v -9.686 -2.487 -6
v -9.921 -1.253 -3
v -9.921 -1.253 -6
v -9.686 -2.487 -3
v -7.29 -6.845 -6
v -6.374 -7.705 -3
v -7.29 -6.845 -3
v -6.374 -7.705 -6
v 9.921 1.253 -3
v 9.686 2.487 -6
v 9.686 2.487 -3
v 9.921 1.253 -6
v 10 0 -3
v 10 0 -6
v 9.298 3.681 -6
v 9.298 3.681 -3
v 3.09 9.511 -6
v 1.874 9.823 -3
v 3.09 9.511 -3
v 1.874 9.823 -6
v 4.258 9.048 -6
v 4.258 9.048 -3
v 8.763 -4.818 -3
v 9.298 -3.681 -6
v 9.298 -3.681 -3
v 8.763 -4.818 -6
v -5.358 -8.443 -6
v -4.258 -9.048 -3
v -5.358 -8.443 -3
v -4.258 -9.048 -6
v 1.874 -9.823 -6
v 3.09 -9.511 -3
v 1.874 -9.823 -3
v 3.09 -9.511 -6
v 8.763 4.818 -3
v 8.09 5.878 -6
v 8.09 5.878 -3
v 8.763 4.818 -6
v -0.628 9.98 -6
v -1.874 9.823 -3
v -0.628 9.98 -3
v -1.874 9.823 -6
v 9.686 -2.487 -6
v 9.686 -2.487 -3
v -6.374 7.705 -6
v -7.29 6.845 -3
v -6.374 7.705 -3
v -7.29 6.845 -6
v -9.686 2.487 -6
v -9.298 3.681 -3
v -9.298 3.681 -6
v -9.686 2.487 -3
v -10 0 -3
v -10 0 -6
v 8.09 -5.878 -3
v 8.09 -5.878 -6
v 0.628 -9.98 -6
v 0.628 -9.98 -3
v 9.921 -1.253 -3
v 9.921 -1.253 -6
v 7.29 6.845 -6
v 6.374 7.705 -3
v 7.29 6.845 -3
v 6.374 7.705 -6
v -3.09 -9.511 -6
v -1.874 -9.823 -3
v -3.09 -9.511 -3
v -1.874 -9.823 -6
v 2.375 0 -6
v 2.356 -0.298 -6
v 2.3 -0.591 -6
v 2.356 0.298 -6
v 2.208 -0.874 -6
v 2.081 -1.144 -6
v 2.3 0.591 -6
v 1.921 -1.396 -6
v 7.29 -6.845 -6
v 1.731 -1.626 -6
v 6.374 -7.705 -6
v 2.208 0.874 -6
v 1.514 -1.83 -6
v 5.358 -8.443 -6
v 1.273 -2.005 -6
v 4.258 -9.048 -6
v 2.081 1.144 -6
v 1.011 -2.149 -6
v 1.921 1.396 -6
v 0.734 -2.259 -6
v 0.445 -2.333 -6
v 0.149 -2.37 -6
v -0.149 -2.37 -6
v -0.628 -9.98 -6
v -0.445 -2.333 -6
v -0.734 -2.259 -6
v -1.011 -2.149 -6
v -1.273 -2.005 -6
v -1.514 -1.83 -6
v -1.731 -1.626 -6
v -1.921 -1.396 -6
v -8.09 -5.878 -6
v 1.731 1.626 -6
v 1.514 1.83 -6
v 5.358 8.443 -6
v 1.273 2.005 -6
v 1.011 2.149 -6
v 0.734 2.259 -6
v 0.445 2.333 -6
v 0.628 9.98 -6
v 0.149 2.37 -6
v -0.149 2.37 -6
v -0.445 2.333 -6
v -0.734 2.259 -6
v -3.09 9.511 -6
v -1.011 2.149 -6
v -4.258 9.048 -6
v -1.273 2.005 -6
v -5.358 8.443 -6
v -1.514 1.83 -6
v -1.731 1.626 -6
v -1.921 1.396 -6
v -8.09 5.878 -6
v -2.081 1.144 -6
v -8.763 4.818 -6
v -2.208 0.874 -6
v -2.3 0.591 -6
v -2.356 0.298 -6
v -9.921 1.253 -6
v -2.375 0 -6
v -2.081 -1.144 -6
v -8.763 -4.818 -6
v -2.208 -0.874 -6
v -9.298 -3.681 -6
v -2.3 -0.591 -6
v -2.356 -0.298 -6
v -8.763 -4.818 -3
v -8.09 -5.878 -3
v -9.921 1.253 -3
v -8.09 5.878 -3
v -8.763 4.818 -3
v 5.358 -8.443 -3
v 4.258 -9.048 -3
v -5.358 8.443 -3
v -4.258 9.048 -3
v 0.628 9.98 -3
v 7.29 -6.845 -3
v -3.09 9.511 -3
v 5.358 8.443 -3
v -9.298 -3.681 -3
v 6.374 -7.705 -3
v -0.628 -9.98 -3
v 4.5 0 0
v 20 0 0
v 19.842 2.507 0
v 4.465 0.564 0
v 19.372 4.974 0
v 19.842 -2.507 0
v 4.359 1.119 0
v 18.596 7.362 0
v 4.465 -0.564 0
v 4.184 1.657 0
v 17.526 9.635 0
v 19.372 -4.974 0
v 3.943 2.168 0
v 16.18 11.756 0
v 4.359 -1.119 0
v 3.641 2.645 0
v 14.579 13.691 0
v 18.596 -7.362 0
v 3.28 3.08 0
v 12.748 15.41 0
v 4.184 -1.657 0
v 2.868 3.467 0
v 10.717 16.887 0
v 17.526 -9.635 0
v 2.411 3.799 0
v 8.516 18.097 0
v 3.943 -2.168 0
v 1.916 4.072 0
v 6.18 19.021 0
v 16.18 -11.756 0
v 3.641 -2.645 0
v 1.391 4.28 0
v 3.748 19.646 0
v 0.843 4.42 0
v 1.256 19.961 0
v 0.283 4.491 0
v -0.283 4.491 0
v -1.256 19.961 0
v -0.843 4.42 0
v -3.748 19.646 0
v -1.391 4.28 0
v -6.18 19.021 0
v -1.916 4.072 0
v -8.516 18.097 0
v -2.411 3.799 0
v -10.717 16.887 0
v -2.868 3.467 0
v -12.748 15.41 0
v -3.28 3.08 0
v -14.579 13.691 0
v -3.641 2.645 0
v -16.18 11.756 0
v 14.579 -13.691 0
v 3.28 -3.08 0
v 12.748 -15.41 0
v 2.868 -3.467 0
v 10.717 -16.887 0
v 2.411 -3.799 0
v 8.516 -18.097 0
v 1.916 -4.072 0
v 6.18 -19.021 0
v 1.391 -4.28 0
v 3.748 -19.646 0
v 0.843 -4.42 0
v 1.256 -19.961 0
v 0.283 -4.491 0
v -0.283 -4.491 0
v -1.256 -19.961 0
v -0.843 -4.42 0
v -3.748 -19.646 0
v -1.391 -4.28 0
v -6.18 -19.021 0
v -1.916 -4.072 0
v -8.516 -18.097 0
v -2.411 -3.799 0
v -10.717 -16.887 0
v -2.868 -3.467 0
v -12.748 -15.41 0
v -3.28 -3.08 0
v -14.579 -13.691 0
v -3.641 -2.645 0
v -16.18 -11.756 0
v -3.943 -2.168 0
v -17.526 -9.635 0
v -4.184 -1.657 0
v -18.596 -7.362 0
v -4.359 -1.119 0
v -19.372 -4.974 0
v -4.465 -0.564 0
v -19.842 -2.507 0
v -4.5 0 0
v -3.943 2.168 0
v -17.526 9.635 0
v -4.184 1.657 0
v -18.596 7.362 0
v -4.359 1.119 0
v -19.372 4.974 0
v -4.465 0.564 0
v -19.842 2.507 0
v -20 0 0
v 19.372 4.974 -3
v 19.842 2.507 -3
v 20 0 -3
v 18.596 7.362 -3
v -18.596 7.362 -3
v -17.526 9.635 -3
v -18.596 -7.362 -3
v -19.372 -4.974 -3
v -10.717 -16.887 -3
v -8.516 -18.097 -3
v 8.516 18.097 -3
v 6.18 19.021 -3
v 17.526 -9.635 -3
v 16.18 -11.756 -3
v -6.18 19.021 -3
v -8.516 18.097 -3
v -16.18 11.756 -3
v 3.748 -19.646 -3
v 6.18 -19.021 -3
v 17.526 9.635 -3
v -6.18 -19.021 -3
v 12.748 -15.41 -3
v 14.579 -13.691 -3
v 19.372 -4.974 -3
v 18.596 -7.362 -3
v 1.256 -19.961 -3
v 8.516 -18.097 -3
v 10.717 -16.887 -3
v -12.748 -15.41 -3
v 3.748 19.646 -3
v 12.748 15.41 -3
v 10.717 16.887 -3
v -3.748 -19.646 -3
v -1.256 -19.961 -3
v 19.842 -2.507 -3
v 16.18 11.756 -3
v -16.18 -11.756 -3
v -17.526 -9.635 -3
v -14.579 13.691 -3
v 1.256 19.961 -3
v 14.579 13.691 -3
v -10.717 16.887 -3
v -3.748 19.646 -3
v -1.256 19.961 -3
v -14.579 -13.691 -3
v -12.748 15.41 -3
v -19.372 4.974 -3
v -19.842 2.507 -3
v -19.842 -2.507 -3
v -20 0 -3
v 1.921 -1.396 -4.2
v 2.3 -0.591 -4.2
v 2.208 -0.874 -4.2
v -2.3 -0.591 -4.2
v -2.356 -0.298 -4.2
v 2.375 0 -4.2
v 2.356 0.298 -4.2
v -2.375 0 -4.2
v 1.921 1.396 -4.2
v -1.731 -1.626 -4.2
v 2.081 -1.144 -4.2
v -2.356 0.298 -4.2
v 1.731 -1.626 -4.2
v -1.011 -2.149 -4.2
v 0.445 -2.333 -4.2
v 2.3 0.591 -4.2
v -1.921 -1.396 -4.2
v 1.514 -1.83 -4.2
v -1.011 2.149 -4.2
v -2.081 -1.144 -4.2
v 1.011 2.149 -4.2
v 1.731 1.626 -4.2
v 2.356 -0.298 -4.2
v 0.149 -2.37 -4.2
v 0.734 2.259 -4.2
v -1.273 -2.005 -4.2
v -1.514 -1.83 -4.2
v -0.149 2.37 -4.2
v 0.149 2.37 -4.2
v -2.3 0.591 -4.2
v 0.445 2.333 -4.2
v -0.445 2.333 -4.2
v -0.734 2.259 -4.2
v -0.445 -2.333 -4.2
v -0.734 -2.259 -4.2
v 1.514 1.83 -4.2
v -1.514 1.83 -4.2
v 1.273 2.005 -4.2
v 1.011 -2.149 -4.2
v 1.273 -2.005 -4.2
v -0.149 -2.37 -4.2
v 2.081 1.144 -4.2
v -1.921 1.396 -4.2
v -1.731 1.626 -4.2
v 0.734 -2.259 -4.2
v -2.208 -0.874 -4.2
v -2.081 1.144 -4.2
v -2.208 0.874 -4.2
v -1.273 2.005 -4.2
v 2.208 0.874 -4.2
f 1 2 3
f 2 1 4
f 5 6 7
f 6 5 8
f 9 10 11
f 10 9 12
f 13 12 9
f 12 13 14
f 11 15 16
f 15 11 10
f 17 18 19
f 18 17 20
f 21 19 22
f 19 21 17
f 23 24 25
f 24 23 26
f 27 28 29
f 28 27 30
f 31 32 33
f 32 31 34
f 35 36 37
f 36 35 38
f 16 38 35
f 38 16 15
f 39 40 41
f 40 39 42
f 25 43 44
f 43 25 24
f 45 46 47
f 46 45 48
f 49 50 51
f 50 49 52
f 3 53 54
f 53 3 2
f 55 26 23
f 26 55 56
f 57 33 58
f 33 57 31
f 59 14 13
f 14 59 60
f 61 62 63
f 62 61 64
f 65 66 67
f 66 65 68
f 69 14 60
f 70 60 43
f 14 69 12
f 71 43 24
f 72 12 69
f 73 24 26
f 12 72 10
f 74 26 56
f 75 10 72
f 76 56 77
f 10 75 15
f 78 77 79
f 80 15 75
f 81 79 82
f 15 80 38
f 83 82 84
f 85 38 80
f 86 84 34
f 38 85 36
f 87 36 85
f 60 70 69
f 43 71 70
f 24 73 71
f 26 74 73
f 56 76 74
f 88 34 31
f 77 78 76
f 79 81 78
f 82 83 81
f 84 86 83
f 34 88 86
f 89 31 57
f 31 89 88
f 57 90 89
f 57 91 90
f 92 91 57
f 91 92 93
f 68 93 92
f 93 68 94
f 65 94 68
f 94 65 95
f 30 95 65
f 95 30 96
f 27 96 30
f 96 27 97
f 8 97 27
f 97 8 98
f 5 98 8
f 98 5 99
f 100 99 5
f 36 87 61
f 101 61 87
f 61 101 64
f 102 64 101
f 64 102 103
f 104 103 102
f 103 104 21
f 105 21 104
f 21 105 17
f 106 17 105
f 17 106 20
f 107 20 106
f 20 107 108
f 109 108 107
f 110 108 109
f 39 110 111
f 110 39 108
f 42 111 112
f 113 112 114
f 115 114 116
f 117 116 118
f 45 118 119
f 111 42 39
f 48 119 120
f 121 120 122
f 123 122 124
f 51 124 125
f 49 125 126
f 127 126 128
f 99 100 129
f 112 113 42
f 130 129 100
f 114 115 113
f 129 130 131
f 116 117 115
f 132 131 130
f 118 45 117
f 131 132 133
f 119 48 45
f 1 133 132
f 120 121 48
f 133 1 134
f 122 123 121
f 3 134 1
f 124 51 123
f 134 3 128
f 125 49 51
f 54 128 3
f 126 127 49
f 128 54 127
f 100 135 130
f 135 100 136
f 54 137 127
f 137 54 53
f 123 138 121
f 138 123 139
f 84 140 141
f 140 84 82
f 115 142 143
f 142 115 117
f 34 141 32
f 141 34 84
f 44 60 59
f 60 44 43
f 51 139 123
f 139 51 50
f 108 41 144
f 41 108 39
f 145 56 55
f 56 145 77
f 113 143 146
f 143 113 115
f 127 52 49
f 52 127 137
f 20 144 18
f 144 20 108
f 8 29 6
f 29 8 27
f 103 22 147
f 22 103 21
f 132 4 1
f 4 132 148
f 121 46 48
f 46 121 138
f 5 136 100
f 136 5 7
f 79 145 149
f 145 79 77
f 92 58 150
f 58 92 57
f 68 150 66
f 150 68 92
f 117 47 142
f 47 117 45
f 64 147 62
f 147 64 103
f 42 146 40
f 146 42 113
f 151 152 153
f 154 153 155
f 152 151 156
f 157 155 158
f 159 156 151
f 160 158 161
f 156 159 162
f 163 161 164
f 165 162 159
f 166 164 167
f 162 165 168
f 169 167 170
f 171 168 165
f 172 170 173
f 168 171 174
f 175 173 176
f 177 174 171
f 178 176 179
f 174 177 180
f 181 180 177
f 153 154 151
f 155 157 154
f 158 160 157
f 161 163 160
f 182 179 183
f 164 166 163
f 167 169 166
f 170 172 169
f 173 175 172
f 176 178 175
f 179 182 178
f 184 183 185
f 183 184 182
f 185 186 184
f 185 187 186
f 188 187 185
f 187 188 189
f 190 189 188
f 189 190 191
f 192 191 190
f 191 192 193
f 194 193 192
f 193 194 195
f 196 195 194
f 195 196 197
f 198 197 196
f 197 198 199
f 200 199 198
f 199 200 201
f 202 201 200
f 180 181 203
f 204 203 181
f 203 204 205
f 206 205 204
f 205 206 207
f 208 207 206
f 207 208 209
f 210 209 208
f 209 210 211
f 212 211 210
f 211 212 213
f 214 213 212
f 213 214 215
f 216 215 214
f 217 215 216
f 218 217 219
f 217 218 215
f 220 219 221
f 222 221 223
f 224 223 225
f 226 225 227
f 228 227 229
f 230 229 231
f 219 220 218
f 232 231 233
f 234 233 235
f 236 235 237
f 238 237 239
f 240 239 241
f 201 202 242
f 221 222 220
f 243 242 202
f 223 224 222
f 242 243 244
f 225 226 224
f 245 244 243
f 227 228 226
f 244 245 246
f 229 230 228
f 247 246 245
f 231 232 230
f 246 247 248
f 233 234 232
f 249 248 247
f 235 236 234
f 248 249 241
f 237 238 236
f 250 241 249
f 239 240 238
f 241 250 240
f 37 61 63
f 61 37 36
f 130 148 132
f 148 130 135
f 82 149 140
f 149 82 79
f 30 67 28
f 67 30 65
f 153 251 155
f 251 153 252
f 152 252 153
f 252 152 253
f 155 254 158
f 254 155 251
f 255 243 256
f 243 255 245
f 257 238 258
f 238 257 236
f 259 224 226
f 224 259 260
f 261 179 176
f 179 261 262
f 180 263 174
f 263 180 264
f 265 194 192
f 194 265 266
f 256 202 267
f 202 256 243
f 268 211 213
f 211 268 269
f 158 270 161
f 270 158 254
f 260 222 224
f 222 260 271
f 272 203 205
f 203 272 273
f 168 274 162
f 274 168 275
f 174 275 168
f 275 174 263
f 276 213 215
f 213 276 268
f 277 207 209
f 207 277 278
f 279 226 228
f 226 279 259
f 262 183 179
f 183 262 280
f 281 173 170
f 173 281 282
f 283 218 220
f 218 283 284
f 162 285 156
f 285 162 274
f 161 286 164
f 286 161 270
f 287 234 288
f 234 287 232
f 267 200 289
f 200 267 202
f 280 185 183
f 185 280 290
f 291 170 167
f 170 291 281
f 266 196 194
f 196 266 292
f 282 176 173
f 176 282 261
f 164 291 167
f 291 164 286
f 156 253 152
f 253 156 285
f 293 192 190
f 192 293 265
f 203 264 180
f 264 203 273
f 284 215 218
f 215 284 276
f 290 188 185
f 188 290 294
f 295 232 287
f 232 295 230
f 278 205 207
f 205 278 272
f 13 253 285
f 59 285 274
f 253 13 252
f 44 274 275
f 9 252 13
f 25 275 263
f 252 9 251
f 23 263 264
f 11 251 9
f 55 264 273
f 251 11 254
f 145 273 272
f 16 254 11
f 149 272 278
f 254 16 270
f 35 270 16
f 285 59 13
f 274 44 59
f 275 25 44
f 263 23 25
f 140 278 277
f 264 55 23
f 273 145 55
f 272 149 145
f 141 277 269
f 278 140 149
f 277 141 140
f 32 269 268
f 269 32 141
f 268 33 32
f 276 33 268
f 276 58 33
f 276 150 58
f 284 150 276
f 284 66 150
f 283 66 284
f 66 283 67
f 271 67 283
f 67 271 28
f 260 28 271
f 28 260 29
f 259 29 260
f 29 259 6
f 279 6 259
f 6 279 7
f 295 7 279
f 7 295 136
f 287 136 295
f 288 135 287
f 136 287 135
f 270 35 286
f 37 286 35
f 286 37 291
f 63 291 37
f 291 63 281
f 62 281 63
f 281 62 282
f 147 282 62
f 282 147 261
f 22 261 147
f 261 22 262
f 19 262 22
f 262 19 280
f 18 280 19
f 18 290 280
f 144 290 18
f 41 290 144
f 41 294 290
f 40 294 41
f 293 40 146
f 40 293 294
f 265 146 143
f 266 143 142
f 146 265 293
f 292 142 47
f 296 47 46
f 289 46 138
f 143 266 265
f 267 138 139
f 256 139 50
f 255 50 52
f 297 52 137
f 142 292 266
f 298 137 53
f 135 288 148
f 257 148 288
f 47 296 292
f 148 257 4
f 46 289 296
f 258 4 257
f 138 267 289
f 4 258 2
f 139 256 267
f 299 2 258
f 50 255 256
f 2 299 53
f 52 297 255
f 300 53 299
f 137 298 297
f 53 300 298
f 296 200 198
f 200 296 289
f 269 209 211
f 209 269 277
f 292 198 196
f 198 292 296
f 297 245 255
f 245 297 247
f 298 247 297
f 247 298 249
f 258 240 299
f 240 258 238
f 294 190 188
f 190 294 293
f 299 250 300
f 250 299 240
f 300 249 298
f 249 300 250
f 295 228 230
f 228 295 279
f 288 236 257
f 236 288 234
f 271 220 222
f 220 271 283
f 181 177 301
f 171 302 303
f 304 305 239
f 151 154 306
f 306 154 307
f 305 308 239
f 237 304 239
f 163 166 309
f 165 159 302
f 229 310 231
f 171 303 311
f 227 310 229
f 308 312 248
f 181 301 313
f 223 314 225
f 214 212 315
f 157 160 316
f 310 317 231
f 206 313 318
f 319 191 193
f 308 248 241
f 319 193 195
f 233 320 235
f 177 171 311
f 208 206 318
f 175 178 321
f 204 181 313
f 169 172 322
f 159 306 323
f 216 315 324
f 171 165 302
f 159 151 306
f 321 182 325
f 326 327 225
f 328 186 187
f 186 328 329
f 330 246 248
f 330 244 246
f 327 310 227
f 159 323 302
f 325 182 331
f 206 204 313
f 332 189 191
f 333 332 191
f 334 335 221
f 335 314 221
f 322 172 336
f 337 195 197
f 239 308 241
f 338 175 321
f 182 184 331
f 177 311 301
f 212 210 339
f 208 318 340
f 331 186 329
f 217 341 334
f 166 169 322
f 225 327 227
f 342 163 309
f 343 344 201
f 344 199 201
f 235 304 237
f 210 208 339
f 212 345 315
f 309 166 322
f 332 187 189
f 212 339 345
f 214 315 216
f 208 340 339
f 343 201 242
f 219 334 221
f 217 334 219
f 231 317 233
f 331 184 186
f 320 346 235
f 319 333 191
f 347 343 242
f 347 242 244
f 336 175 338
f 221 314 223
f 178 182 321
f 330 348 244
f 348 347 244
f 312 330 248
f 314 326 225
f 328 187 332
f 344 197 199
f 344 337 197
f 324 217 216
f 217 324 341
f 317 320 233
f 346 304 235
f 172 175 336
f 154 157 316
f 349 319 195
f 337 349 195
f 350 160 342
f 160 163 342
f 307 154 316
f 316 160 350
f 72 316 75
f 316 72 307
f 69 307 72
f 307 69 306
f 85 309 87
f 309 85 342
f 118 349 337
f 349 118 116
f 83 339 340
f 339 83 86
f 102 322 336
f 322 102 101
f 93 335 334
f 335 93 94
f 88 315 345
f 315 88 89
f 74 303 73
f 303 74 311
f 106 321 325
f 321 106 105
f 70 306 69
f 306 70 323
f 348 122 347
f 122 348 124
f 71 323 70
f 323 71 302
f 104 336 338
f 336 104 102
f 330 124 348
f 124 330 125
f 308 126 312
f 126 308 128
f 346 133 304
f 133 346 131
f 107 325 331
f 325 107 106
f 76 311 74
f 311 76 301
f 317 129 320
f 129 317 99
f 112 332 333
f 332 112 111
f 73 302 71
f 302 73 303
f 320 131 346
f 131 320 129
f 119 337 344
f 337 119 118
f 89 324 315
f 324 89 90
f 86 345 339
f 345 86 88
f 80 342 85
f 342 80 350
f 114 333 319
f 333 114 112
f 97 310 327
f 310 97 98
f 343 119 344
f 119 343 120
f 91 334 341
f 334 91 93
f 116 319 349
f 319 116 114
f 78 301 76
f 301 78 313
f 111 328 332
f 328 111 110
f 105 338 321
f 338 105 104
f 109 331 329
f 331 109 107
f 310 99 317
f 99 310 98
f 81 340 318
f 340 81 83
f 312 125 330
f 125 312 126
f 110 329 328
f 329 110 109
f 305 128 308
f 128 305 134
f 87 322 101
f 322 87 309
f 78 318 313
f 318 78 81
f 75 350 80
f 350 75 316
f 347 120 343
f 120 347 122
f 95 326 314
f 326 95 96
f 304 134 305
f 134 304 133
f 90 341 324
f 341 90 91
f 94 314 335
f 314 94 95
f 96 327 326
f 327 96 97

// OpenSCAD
$fn = 50;


difference() {
	union() {
		translate(v = [0, 0, -6.0000000000]) {
			cylinder(h = 6, r = 10.0000000000);
		}
		translate(v = [0, 0, -3.0000000000]) {
			cylinder(h = 3, r = 20.0000000000);
		}
	}
	union() {
		translate(v = [0, 0, 0]) {
			rotate(a = [0, 0, 0]) {
				difference() {
					union() {
						#translate(v = [0, 0, -6.0000000000]) {
							cylinder(h = 6, r = 2.2500000000);
						}
						#translate(v = [0, 0, -4.2000000000]) {
							cylinder(h = 4.2000000000, r1 = 2.3750000000, r2 = 4.5000000000);
						}
						#translate(v = [0, 0, -6.0000000000]) {
							cylinder(h = 6, r = 2.3750000000);
						}
						#translate(v = [0, 0, -6.0000000000]) {
							cylinder(h = 6, r = 2.2500000000);
						}
					}
					union();
				}
			}
		}
	}
}
